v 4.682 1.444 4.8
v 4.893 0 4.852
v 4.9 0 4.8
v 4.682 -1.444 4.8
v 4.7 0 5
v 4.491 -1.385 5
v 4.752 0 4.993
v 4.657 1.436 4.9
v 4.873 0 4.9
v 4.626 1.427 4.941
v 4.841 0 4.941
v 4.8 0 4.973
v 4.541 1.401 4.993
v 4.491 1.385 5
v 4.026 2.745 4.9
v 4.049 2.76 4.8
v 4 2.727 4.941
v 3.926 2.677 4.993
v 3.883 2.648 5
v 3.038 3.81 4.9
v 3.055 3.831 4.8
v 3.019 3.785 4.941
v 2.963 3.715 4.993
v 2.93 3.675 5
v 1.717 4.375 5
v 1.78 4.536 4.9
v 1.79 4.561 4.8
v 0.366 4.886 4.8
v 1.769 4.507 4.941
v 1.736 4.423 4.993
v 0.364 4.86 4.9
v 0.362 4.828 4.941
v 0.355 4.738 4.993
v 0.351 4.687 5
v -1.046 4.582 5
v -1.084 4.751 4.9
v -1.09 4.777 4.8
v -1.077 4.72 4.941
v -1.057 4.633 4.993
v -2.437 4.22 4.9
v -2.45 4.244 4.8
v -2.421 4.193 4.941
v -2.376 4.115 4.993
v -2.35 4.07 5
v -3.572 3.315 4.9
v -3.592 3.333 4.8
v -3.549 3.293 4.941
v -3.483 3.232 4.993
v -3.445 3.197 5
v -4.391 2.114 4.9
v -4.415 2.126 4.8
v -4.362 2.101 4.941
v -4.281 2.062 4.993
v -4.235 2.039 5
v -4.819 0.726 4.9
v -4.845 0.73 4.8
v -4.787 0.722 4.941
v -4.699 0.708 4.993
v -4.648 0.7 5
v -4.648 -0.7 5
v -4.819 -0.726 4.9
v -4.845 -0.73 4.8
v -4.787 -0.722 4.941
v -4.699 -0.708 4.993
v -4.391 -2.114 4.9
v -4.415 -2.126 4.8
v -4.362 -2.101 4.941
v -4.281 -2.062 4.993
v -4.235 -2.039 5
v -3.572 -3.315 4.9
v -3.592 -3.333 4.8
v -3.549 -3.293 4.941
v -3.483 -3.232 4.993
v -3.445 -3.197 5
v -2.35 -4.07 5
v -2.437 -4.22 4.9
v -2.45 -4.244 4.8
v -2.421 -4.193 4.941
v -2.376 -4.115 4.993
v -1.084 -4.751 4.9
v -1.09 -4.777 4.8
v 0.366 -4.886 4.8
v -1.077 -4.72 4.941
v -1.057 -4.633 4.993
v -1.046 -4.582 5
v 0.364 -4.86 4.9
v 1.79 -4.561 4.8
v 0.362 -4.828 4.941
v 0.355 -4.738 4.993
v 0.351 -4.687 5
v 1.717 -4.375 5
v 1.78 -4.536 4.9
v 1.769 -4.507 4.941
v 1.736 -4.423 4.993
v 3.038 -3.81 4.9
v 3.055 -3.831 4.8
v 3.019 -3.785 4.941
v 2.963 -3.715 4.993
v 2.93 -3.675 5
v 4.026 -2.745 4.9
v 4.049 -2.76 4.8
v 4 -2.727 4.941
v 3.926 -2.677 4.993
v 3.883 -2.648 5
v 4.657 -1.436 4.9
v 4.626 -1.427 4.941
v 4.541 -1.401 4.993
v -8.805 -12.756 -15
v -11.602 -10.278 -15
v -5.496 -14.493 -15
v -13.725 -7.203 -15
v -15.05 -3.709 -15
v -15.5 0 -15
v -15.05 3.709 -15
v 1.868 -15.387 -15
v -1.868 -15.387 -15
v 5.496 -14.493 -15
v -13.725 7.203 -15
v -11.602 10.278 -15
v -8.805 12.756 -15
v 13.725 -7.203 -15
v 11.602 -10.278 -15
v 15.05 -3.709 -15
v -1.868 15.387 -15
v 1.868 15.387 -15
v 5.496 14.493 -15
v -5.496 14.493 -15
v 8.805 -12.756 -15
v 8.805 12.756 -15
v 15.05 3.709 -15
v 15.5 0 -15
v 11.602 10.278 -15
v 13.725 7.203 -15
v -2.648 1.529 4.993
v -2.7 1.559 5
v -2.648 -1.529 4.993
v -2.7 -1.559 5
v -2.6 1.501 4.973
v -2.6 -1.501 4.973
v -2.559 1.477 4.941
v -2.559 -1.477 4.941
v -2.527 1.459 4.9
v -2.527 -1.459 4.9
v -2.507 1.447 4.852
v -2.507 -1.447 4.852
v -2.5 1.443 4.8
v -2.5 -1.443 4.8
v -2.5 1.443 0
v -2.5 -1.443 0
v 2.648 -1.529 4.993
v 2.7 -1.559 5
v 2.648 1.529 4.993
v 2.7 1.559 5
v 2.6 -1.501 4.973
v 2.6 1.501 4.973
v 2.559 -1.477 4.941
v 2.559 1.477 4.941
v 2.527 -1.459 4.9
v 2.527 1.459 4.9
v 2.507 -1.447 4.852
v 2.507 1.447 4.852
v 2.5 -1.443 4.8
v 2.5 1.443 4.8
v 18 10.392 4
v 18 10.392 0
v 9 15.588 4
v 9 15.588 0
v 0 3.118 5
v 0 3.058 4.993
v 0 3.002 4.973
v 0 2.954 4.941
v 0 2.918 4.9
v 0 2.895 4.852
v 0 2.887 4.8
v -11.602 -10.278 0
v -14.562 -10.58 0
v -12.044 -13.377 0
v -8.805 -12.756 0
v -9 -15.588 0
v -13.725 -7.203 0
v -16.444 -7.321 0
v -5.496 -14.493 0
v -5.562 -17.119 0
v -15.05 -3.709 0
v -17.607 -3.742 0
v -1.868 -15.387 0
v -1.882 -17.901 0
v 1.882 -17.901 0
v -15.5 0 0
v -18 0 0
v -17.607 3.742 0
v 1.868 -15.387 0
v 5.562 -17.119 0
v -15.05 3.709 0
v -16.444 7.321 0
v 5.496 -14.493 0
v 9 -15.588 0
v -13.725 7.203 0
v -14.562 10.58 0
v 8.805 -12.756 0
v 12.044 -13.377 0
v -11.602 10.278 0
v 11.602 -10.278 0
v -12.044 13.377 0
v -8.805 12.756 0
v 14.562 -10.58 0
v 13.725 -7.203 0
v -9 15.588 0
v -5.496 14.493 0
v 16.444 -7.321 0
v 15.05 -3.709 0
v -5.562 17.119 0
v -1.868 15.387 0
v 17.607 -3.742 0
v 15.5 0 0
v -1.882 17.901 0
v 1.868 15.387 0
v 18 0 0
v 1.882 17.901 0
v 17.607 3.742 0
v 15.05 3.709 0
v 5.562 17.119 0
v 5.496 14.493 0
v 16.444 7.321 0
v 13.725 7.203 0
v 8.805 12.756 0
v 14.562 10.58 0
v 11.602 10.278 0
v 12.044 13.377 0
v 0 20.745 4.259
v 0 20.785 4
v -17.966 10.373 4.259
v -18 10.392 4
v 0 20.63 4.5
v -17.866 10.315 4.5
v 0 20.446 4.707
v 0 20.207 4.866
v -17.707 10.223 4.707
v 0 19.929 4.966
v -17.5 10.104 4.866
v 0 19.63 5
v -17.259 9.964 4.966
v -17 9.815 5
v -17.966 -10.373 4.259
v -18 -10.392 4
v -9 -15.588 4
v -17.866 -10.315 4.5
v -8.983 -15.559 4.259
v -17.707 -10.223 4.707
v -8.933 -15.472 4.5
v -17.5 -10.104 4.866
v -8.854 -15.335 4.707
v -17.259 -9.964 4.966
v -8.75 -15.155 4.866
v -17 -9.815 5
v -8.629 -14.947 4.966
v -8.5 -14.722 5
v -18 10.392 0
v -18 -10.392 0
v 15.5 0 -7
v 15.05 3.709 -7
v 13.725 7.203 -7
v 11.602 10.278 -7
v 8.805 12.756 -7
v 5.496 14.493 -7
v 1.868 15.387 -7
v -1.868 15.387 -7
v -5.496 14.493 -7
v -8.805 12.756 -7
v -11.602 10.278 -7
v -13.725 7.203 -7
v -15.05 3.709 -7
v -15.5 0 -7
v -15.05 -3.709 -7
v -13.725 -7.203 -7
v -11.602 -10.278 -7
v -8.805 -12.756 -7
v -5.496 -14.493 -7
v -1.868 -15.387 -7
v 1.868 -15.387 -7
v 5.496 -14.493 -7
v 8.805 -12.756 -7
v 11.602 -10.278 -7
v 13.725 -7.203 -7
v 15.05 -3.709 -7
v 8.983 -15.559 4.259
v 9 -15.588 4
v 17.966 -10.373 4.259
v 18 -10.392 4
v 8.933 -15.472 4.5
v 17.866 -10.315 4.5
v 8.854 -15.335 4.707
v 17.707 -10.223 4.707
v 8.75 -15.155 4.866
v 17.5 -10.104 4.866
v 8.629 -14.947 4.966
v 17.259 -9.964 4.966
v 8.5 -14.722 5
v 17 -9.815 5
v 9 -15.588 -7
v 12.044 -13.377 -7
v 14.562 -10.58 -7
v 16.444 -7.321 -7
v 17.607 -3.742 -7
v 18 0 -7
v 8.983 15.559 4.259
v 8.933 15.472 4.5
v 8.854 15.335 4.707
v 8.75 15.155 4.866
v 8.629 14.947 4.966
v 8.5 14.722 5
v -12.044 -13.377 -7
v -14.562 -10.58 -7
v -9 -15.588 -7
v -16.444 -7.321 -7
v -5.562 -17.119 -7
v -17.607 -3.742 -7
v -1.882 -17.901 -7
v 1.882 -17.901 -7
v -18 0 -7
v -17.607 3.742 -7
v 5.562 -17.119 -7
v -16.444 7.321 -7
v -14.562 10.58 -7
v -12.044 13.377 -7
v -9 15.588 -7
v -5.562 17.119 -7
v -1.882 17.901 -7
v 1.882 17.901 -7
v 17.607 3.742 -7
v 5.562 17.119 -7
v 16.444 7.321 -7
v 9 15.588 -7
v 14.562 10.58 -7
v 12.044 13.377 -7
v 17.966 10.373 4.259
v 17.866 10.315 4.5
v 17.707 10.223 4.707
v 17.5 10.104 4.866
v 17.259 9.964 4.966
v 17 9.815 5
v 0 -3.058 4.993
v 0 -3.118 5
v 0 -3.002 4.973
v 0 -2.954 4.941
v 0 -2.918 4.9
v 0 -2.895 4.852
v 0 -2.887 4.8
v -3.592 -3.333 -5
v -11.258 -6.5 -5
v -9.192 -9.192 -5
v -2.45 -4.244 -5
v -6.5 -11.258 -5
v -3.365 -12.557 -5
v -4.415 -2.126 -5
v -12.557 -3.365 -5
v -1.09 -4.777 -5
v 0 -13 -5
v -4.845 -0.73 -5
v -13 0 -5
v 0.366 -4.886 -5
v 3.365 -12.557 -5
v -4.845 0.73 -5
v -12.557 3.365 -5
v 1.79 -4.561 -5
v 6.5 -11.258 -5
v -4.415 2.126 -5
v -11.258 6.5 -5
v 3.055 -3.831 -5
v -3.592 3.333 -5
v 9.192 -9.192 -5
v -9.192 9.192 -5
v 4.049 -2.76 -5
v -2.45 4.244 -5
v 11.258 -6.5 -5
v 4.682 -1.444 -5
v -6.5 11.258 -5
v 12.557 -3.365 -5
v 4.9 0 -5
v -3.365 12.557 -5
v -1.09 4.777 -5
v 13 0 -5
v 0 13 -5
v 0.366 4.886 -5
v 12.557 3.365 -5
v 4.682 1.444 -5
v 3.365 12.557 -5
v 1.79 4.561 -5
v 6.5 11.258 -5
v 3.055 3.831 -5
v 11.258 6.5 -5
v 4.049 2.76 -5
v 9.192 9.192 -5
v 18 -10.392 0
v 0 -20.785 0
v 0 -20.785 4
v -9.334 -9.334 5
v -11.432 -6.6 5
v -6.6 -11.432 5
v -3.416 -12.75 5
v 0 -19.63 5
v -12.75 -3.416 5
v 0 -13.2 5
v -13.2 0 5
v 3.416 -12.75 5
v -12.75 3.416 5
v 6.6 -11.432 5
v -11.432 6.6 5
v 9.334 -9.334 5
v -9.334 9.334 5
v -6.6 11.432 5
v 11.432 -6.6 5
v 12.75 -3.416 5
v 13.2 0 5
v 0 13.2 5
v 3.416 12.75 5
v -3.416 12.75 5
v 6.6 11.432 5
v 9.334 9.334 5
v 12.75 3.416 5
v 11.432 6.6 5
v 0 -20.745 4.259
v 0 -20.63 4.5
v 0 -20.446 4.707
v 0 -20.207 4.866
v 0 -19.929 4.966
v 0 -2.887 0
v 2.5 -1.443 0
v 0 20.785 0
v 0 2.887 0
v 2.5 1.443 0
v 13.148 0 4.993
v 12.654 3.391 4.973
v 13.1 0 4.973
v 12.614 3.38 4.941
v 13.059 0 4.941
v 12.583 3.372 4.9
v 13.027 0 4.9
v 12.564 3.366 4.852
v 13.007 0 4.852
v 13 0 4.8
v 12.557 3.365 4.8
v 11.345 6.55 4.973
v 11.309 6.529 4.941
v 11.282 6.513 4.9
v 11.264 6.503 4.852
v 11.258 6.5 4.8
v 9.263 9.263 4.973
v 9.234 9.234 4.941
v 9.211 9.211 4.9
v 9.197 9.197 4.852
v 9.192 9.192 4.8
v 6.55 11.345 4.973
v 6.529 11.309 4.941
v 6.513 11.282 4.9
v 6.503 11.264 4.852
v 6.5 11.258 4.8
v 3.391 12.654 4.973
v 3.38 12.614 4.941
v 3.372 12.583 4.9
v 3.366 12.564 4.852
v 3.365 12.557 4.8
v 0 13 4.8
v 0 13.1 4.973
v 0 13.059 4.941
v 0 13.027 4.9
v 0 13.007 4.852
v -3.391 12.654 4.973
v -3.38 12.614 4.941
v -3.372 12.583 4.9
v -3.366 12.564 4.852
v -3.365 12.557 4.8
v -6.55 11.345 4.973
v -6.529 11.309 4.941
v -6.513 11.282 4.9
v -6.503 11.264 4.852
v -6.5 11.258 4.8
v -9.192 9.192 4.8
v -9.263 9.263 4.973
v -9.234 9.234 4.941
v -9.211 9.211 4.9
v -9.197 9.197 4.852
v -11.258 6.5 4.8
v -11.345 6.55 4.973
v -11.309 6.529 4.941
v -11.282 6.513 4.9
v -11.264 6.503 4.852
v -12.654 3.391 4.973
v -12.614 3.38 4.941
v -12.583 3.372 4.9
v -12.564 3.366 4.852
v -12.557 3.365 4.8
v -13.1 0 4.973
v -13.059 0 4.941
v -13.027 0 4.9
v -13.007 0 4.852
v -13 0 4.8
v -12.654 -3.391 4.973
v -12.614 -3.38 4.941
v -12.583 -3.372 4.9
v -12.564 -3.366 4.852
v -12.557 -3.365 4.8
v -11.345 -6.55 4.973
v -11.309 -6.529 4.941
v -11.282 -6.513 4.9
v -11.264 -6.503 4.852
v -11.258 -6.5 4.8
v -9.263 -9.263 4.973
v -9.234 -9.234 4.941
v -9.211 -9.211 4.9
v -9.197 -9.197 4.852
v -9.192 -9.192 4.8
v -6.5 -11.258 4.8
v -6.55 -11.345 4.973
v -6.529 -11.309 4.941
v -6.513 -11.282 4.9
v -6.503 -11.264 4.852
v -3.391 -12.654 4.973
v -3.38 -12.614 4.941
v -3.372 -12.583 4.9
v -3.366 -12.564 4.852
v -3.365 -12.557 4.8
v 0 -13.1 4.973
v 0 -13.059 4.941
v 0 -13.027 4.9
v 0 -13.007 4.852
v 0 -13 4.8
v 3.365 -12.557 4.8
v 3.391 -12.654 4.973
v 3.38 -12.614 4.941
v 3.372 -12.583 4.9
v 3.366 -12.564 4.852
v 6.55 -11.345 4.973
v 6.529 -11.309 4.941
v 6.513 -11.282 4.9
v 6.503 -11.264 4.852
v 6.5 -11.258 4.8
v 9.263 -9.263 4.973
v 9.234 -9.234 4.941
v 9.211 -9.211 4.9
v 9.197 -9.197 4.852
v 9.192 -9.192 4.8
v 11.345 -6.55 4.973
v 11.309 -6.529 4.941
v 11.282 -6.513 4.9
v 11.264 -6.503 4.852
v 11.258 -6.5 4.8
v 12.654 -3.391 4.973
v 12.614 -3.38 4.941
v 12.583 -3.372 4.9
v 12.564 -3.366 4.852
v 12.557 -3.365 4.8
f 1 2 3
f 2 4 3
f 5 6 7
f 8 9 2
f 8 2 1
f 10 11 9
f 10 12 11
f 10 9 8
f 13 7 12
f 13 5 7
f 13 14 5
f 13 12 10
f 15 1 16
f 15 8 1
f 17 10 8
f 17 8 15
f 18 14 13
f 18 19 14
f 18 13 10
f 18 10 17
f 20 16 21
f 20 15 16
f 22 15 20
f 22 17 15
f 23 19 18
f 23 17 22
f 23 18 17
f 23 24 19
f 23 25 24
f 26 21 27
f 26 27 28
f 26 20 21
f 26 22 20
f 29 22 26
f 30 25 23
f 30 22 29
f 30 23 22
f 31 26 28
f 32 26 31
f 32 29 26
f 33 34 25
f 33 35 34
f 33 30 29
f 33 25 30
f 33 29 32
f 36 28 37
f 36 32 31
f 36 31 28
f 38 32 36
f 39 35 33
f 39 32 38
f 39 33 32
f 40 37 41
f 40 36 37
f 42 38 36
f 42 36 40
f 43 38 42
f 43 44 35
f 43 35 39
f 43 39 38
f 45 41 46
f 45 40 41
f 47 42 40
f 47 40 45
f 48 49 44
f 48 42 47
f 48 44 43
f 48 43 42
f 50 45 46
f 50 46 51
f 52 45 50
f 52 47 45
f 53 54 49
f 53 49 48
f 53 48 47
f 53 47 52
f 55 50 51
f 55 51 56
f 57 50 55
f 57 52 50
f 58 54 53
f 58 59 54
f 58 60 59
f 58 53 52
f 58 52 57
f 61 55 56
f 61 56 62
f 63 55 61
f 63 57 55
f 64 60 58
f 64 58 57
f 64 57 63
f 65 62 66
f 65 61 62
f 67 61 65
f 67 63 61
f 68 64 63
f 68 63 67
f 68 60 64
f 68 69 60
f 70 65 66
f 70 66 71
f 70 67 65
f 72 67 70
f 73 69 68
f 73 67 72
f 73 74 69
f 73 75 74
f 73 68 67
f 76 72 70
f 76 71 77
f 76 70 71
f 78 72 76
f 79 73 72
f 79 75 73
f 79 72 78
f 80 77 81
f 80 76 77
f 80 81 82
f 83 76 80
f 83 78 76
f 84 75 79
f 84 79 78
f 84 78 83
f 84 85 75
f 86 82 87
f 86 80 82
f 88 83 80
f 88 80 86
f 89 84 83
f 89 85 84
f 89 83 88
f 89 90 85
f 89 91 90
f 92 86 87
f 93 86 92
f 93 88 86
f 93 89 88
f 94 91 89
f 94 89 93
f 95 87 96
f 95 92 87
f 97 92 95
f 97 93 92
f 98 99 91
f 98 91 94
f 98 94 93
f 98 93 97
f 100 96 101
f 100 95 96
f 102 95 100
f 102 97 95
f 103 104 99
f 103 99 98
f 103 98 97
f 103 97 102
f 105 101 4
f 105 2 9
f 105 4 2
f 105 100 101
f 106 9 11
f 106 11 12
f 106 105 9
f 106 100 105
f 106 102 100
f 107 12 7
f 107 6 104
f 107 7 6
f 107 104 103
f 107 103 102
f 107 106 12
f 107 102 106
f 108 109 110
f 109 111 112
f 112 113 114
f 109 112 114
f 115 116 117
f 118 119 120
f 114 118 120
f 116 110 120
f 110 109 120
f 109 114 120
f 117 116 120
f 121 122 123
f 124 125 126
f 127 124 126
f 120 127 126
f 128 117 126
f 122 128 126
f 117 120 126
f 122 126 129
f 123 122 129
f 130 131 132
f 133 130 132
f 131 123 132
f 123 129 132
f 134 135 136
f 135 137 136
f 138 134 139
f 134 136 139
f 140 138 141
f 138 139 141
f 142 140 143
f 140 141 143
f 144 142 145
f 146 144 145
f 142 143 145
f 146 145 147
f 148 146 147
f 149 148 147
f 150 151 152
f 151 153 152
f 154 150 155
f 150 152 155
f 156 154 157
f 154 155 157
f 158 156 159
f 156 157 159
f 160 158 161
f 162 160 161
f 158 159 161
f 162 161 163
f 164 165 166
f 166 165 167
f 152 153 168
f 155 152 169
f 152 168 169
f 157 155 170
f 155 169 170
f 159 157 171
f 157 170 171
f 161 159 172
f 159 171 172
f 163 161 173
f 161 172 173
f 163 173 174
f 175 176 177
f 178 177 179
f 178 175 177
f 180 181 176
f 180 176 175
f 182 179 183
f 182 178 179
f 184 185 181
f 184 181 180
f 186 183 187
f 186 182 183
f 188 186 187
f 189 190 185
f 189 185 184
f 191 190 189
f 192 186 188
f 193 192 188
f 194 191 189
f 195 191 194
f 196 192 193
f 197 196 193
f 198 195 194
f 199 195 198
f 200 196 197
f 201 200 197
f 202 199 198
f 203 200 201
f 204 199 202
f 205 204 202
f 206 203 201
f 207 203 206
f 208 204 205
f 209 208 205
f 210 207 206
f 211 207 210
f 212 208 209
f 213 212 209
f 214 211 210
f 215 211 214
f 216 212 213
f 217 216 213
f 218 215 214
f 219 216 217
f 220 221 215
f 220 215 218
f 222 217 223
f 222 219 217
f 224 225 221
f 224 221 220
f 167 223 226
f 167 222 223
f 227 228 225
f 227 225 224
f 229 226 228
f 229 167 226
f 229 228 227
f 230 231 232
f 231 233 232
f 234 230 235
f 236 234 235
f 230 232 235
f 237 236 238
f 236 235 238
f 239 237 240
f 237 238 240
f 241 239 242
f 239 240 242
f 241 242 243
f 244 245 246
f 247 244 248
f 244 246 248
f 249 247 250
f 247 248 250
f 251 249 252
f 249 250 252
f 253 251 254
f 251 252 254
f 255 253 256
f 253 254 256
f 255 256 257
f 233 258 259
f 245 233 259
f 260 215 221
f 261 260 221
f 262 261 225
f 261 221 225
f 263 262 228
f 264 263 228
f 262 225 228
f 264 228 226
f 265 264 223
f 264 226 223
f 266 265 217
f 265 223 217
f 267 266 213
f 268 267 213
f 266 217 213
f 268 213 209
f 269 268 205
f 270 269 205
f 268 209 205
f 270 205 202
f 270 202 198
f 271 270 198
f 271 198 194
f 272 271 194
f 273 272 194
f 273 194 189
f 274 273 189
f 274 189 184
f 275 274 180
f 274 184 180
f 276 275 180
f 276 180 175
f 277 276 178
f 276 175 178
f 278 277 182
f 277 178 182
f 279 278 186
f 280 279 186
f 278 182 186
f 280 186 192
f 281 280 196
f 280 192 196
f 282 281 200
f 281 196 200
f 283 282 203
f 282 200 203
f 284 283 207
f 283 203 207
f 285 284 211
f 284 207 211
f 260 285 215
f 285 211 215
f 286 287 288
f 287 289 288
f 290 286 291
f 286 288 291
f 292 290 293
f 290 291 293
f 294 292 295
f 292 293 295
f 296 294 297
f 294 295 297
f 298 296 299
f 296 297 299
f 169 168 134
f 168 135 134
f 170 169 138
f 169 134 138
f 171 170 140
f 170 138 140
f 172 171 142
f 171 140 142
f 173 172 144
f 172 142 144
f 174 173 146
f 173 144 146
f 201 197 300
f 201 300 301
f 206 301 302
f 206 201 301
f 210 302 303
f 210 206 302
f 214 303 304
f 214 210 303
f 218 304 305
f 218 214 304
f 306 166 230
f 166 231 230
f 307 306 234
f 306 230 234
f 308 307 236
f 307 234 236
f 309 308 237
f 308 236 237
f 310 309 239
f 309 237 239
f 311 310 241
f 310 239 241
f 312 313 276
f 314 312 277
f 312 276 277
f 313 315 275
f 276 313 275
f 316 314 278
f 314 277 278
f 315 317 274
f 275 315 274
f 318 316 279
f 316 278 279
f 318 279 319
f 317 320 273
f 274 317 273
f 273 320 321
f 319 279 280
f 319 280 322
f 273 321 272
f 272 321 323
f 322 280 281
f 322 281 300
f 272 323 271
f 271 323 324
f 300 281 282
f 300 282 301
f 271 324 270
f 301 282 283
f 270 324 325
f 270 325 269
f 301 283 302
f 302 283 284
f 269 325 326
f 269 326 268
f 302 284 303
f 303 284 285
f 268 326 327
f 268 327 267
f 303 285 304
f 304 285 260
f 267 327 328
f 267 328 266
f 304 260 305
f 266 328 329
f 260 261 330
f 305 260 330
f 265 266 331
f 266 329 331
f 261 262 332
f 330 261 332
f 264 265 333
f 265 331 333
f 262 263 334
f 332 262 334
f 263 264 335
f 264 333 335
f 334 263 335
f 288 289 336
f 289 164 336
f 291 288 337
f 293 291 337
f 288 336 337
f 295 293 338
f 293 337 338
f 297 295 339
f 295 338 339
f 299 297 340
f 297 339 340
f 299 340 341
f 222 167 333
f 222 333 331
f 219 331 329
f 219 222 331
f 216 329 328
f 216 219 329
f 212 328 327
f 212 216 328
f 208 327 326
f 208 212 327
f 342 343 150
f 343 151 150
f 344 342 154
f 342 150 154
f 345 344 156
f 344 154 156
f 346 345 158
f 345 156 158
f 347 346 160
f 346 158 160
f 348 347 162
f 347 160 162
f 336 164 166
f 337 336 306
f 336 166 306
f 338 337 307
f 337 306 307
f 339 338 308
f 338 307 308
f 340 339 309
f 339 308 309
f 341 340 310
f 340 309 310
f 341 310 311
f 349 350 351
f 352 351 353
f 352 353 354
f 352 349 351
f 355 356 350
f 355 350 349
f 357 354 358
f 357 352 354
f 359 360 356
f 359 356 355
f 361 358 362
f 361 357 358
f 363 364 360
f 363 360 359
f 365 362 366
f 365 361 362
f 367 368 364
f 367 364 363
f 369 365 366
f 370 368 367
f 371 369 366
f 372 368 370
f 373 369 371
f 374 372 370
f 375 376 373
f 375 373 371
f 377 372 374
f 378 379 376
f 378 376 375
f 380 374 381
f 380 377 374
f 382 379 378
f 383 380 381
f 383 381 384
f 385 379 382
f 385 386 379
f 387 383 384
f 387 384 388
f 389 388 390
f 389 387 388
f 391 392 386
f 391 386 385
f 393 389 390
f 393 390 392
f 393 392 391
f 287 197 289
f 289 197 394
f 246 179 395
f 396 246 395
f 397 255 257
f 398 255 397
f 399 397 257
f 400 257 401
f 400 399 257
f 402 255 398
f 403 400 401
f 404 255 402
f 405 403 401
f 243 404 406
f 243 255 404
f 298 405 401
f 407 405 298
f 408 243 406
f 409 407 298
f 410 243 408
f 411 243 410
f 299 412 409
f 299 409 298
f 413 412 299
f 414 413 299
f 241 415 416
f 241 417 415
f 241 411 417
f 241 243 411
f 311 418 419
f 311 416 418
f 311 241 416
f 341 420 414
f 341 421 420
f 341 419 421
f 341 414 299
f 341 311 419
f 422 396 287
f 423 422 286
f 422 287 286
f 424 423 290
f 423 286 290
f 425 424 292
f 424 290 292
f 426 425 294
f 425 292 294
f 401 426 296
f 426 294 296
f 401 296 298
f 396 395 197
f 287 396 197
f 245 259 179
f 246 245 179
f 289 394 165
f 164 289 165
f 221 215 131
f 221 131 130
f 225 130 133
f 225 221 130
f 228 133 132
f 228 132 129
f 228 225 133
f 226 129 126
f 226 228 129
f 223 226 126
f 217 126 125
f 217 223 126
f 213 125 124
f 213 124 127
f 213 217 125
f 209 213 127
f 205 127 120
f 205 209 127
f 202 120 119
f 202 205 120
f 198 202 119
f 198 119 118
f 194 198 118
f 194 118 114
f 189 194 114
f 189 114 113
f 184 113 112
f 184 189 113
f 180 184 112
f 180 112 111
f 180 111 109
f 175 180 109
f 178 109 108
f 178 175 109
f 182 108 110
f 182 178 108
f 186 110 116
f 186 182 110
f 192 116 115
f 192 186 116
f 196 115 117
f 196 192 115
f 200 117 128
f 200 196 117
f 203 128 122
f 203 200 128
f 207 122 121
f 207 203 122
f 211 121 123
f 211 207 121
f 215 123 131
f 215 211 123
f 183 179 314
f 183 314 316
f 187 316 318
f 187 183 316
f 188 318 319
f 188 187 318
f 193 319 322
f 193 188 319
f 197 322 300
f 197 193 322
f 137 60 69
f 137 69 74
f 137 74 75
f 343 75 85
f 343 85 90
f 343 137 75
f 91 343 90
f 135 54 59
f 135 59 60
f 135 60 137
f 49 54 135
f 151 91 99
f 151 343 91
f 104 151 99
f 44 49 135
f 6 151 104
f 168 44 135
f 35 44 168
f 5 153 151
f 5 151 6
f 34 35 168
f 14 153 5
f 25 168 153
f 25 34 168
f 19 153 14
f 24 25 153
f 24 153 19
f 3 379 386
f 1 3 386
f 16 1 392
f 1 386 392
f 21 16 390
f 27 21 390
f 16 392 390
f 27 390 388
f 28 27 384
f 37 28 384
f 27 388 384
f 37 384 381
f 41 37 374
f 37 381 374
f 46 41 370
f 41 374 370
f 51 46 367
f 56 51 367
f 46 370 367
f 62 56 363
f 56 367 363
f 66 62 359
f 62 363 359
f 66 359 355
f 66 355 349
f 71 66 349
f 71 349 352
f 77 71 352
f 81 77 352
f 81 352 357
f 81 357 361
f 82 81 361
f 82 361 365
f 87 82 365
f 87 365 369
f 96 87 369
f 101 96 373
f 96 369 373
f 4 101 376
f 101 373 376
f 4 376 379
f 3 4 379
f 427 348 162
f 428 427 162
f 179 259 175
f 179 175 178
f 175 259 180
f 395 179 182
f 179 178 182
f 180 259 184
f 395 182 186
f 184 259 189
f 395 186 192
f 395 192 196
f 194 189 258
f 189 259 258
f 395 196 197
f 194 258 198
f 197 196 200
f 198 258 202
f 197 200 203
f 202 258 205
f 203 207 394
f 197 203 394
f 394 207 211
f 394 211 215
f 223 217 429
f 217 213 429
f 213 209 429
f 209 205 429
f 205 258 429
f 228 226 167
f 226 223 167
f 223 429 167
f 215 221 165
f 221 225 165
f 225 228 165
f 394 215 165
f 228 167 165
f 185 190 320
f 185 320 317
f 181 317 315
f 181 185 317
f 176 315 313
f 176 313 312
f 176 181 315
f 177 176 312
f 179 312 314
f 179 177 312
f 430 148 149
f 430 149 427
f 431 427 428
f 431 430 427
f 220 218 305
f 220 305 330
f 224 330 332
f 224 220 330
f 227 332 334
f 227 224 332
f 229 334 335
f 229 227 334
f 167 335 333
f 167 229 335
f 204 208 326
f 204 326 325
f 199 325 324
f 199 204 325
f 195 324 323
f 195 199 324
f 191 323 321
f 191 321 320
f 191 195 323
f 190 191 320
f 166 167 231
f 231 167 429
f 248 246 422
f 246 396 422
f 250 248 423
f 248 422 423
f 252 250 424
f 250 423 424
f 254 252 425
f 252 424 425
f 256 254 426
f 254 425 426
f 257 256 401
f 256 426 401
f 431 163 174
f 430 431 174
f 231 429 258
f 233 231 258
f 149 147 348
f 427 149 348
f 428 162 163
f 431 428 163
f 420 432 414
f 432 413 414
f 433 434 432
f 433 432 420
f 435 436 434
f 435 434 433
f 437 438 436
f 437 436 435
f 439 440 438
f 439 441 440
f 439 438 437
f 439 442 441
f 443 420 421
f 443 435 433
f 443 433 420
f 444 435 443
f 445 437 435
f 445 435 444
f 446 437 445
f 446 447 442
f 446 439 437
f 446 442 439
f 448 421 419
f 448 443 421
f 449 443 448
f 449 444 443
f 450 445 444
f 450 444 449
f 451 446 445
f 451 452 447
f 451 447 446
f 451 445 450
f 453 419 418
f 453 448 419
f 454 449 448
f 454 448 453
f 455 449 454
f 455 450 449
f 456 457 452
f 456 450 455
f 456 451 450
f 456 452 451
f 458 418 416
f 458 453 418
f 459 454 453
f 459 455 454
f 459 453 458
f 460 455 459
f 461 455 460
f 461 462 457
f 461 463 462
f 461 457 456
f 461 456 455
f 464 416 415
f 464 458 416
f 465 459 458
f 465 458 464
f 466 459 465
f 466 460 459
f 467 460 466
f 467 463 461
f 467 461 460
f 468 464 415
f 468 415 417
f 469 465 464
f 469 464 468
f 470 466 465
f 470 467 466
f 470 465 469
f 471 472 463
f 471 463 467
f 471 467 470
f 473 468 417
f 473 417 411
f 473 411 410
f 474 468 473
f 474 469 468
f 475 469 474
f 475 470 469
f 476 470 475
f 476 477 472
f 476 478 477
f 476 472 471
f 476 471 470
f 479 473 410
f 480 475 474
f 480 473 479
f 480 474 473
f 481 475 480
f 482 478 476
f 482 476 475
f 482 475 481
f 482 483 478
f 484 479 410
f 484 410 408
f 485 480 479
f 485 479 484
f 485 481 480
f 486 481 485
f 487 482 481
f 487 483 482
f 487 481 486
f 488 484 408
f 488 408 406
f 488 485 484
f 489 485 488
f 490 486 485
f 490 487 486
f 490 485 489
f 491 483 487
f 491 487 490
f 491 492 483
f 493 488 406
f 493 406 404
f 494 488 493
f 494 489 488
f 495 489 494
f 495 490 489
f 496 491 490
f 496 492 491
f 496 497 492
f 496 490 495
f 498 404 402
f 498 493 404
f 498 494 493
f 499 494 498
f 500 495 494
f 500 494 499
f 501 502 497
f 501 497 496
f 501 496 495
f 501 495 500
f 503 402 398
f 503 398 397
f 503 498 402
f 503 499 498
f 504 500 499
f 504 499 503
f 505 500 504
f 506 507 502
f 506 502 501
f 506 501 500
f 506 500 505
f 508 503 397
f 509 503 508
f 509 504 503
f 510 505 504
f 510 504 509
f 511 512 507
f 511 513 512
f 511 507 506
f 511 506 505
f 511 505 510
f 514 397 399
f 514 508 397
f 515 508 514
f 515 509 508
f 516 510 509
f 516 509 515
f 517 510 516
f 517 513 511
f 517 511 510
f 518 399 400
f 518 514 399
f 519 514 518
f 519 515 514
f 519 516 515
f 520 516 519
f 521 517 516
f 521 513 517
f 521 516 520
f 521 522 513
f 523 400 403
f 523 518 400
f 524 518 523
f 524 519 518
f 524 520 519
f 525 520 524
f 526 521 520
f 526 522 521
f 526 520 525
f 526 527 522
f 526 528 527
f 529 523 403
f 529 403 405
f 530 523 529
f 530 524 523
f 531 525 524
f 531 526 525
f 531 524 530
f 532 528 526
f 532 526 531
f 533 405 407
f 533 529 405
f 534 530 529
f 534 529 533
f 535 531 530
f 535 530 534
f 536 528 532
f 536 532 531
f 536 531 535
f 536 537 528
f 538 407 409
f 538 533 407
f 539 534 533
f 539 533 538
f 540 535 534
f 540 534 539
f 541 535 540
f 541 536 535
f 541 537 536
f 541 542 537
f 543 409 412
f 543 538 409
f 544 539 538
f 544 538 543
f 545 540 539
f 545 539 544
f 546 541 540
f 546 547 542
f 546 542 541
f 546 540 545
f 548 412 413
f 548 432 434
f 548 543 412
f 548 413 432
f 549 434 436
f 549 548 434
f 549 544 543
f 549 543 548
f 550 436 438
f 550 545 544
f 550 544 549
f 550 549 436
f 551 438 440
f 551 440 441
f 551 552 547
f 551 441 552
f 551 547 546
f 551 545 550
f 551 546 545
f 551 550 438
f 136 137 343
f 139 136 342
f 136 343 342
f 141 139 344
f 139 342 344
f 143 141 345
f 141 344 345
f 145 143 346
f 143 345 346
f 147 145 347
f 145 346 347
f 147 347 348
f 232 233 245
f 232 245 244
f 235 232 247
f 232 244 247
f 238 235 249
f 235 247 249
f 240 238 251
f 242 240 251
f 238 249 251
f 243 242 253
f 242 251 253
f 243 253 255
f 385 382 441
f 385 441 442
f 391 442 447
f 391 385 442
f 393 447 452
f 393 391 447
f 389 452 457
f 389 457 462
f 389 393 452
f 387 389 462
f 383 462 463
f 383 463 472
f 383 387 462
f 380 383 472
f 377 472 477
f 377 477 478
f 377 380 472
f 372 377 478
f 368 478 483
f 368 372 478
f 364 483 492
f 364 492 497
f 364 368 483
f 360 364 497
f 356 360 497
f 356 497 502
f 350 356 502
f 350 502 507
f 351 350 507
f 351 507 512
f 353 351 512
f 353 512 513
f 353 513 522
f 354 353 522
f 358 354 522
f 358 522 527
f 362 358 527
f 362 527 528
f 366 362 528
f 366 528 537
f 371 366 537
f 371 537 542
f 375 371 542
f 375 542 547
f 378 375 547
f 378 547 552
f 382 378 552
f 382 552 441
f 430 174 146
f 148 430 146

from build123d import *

# Parameters (mm, degrees)
F0_R      = 15.5
F0_R_2    = 13
F1_DEPTH  = 5
F2_R      = 1
F3_DEPTH  = 15
F4_DEPTH  = 5
F5_R      = 4.9
F6_DEPTH  = 10
F8_DEPTH  = 5
F9_R      = 0.2
F10_DEPTH = 7


# Not quite as in the source:
# - a feature names something its author has since deleted; it is built from what else it names


with BuildPart() as f1:
    # F0 (on Top) → F1 (new body)
    with BuildSketch(Plane.XY):
        with BuildLine():
            ThreePointArc((8.9999996925, -15.5884574456), (15.5884571794, -9.0000001537), (18, 0))
            ThreePointArc((18, 0), (15.588457371, 8.9999998218), (9.0000003564, 15.5884570623))
            ThreePointArc((9.0000003564, 15.5884570623), (3.256e-07, 18), (-8.9999997925, 15.5884573879))
            ThreePointArc((-8.9999997925, 15.5884573879), (-15.5884572082, 9.0000001038), (-18, 0))
            ThreePointArc((-18, 0), (-15.588457331, -8.9999998911), (-9.0000002178, -15.5884571424))
            ThreePointArc((-9.0000002178, -15.5884571424), (-3.032e-07, -18), (8.9999996925, -15.5884574456))
        make_face()
        Circle(F0_R, mode=Mode.SUBTRACT)
        with BuildLine():
            ThreePointArc((-8.9999997925, 15.5884573879), (3.256e-07, 18), (9.0000003564, 15.5884570623))
            Line((9.0000003564, 15.5884570623), (0, 20.7846096908))
            Line((0, 20.7846096908), (-8.9999997925, 15.5884573879))
        make_face()
        with BuildLine():
            Line((18, 0), (18, 10.3923048454))
            Line((18, 10.3923048454), (9.0000003564, 15.5884570623))
            ThreePointArc((9.0000003564, 15.5884570623), (15.588457371, 8.9999998218), (18, 0))
        make_face()
        with BuildLine():
            ThreePointArc((-18, 0), (-15.5884572082, 9.0000001038), (-8.9999997925, 15.5884573879))
            Line((-8.9999997925, 15.5884573879), (-18, 10.3923048454))
            Line((-18, 10.3923048454), (-18, 0))
        make_face()
        with BuildLine():
            Line((-18, -10.3923048454), (-9.0000002178, -15.5884571424))
            ThreePointArc((-9.0000002178, -15.5884571424), (-15.588457331, -8.9999998911), (-18, 0))
            Line((-18, 0), (-18, -10.3923048454))
        make_face()
        with BuildLine():
            Line((0, -20.7846096908), (8.9999996925, -15.5884574456))
            ThreePointArc((8.9999996925, -15.5884574456), (-3.032e-07, -18), (-9.0000002178, -15.5884571424))
            Line((-9.0000002178, -15.5884571424), (0, -20.7846096908))
        make_face()
        with BuildLine():
            Line((18, -10.3923048454), (18, 0))
            ThreePointArc((18, 0), (15.5884571794, -9.0000001537), (8.9999996925, -15.5884574456))
            Line((8.9999996925, -15.5884574456), (18, -10.3923048454))
        make_face()
        Circle(F0_R)
        Circle(F0_R_2, mode=Mode.SUBTRACT)
    extrude(amount=F1_DEPTH)

    # F2
    f2_edges = [f1.edges().sort_by_distance(p)[0] for p in [
        (-18, 0, 5),
        (-9, 15.588457, 5),
        (9, 15.588457, 5),
        (18, 0, 5),
        (9, -15.588457, 5),
        (-9, -15.588457, 5),
    ]]
    fillet(f2_edges, radius=F2_R)

    # F0 (on Top) → F3 (join)
    with BuildSketch(Plane.XY):
        Circle(F0_R)
        Circle(F0_R_2, mode=Mode.SUBTRACT)
        Circle(F0_R_2)
    extrude(amount=-F3_DEPTH)

    # F0 (on Top) → F4 (cut)
    with BuildSketch(Plane.XY):
        Circle(F0_R_2)
    extrude(amount=-F4_DEPTH, mode=Mode.SUBTRACT)

    # F5 (on face) → F6 (join, through all)
    with BuildSketch(Plane.XY.offset(-5)):
        Circle(F5_R)
    extrude(amount=F6_DEPTH)

    # F7 (on face) → F8 (cut)
    with BuildSketch(Plane.XY.offset(5)):
        Polygon((-2.5, 1.443375673), (-2.5, -1.443375673), (0, -2.8867513459), (2.5, -1.443375673), (2.5, 1.443375673), (0, 2.8867513459), align=None)
    extrude(amount=-F8_DEPTH, mode=Mode.SUBTRACT)

    # F9
    f9_edges = [f1.edges().sort_by_distance(p)[0] for p in [
        (-4.9, 0, 5),
        (-13, 0, 5),
        (-1.25, 2.165064, 5),
        (1.25, 2.165064, 5),
        (2.5, 0, 5),
        (1.25, -2.165064, 5),
        (-1.25, -2.165064, 5),
        (-2.5, 0, 5),
    ]]
    fillet(f9_edges, radius=F9_R)


with BuildPart() as f10:
    # F0 (on Top) → F10 (new body)
    with BuildSketch(Plane.XY):
        with BuildLine():
            ThreePointArc((8.9999996925, -15.5884574456), (15.5884571794, -9.0000001537), (18, 0))
            ThreePointArc((18, 0), (15.588457371, 8.9999998218), (9.0000003564, 15.5884570623))
            ThreePointArc((9.0000003564, 15.5884570623), (3.256e-07, 18), (-8.9999997925, 15.5884573879))
            ThreePointArc((-8.9999997925, 15.5884573879), (-15.5884572082, 9.0000001038), (-18, 0))
            ThreePointArc((-18, 0), (-15.588457331, -8.9999998911), (-9.0000002178, -15.5884571424))
            ThreePointArc((-9.0000002178, -15.5884571424), (-3.032e-07, -18), (8.9999996925, -15.5884574456))
        make_face()
        Circle(F0_R, mode=Mode.SUBTRACT)
    extrude(amount=-F10_DEPTH)


solid = Compound([f1.part, f10.part])
